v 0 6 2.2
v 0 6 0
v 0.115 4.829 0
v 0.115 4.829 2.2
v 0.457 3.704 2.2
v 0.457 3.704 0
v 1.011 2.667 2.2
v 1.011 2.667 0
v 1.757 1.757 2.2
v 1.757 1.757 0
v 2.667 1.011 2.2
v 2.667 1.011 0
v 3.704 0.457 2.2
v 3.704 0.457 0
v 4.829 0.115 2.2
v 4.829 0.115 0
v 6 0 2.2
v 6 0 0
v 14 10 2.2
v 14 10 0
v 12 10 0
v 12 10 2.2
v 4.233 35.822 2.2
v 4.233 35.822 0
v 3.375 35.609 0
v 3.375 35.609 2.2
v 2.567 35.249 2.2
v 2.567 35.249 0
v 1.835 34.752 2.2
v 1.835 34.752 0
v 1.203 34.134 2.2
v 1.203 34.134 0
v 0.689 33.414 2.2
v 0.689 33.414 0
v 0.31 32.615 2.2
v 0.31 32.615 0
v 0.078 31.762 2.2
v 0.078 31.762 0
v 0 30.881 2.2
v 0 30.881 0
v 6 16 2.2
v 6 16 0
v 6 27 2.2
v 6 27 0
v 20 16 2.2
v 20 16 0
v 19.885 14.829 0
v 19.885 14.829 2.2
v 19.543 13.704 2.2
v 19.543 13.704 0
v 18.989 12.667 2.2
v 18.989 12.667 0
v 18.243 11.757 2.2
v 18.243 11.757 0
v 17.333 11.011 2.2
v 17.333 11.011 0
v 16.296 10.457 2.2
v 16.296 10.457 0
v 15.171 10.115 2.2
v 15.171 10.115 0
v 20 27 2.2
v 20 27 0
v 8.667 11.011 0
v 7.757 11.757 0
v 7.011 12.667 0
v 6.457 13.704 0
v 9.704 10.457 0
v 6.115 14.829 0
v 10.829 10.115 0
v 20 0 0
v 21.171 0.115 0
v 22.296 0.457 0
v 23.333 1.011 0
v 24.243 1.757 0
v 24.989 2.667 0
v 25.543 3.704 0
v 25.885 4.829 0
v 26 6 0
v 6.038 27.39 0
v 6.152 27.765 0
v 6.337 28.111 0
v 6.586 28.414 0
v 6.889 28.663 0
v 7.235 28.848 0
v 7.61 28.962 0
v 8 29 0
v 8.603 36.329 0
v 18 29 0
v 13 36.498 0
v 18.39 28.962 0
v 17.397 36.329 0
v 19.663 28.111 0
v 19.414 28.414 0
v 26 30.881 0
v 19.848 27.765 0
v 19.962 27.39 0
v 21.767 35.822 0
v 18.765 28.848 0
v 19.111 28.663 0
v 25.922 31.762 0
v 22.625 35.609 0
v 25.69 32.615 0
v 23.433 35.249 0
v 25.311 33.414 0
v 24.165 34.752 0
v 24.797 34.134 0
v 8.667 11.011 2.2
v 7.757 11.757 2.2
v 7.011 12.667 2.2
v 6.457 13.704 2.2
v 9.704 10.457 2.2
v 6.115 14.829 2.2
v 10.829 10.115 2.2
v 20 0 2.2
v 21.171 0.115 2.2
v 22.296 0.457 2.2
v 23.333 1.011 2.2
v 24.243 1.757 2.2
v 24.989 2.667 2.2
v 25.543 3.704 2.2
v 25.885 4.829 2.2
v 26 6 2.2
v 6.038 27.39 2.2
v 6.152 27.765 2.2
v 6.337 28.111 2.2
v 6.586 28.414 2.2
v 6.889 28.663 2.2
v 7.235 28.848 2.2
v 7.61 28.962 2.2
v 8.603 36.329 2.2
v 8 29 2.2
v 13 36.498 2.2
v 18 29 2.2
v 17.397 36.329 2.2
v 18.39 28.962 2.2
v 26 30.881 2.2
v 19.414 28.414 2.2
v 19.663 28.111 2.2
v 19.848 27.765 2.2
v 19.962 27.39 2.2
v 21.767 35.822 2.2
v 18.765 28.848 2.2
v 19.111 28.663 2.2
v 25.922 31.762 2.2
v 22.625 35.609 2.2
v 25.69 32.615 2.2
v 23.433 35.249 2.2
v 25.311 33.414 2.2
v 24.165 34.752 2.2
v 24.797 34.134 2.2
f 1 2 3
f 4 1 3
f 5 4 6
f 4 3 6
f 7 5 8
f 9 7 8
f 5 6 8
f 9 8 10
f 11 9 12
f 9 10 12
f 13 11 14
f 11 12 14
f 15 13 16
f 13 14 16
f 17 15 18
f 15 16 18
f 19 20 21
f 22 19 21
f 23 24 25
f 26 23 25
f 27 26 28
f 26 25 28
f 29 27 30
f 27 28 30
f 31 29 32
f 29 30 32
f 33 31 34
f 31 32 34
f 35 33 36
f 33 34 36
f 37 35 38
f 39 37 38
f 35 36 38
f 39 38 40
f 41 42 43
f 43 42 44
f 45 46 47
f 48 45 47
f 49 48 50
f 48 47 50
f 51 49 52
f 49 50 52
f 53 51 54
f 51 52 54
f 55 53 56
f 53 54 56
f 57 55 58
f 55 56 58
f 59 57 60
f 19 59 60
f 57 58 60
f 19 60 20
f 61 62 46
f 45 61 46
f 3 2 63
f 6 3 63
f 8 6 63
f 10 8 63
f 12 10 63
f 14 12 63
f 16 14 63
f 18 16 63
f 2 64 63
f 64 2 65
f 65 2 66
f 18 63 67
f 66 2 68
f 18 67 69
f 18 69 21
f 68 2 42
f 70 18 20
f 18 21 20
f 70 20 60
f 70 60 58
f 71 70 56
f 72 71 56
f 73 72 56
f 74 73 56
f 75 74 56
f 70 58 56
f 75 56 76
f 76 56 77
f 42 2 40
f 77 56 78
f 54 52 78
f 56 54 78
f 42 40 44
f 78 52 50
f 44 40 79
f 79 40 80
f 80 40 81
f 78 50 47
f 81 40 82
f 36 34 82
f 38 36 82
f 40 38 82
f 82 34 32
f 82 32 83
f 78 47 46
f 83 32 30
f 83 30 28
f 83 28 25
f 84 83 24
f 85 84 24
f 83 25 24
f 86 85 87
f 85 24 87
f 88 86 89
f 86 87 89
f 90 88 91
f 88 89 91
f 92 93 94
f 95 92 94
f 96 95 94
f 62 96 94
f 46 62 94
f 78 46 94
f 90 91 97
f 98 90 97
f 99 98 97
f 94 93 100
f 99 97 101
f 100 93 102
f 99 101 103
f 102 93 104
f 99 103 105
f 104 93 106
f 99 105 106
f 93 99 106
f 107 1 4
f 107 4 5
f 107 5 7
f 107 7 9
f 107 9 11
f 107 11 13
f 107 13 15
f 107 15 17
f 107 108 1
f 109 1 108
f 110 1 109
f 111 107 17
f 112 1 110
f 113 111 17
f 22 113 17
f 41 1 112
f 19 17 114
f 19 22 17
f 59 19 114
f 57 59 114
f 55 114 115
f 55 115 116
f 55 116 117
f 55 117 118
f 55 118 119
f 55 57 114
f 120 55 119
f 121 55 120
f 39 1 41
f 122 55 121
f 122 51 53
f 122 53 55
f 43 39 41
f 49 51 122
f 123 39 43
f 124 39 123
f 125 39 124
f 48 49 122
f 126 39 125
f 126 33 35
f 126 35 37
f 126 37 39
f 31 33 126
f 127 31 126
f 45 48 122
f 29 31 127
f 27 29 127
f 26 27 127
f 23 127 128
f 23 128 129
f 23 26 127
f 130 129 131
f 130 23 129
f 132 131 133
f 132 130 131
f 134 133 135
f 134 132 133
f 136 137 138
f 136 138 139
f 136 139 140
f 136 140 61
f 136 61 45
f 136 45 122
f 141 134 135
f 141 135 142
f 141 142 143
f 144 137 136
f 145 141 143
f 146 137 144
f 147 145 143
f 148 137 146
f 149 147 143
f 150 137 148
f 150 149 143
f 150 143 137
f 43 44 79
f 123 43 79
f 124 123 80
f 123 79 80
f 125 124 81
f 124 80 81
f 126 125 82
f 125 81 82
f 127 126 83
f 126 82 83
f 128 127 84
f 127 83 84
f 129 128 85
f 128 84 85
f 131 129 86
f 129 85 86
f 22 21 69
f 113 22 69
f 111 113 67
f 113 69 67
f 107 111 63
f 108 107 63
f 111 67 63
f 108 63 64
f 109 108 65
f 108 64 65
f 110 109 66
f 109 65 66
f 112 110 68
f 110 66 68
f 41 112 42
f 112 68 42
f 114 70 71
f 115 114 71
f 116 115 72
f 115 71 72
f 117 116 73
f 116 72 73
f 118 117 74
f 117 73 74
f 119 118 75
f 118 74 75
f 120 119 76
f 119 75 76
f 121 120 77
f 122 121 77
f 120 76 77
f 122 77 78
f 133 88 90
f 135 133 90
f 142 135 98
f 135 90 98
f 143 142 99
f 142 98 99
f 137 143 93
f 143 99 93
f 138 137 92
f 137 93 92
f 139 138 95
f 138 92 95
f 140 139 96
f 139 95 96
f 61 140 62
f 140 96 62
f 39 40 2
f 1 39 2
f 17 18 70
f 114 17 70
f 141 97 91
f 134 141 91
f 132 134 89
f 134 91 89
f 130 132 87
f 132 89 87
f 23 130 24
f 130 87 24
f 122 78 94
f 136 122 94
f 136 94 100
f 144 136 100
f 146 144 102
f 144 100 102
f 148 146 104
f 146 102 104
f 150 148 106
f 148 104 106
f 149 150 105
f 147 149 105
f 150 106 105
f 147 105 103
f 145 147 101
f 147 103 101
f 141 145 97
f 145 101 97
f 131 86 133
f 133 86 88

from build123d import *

# Parameters (mm, degrees)
F1_DEPTH = 2.2


with BuildPart() as f1:
    # F0 (on Top) → F1 (new body)
    with BuildSketch(Plane.XY):
        with BuildLine():
            ThreePointArc((0, 6), (1.757359, 1.757359), (6, 0))
            Line((6, 0), (20, 0))
            ThreePointArc((20, 0), (24.242641, 1.757359), (26, 6))
            Line((26, 6), (26, 30.880977))
            ThreePointArc((26, 30.880977), (24.797058, 34.13403), (21.76706, 35.821789))
            ThreePointArc((21.76706, 35.821789), (13, 36.498279), (4.23294, 35.821789))
            ThreePointArc((4.23294, 35.821789), (1.202942, 34.13403), (0, 30.880977))
            Line((0, 30.880977), (0, 6))
        make_face()
        with BuildLine():
            ThreePointArc((6, 27), (6.585786, 28.414214), (8, 29))
            Line((8, 29), (18, 29))
            ThreePointArc((18, 29), (19.414214, 28.414214), (20, 27))
            Line((20, 27), (20, 16))
            ThreePointArc((20, 16), (18.242641, 11.757359), (14, 10))
            Line((14, 10), (12, 10))
            ThreePointArc((12, 10), (7.757359, 11.757359), (6, 16))
            Line((6, 16), (6, 27))
        make_face(mode=Mode.SUBTRACT)
    extrude(amount=F1_DEPTH)


solid = f1.part
